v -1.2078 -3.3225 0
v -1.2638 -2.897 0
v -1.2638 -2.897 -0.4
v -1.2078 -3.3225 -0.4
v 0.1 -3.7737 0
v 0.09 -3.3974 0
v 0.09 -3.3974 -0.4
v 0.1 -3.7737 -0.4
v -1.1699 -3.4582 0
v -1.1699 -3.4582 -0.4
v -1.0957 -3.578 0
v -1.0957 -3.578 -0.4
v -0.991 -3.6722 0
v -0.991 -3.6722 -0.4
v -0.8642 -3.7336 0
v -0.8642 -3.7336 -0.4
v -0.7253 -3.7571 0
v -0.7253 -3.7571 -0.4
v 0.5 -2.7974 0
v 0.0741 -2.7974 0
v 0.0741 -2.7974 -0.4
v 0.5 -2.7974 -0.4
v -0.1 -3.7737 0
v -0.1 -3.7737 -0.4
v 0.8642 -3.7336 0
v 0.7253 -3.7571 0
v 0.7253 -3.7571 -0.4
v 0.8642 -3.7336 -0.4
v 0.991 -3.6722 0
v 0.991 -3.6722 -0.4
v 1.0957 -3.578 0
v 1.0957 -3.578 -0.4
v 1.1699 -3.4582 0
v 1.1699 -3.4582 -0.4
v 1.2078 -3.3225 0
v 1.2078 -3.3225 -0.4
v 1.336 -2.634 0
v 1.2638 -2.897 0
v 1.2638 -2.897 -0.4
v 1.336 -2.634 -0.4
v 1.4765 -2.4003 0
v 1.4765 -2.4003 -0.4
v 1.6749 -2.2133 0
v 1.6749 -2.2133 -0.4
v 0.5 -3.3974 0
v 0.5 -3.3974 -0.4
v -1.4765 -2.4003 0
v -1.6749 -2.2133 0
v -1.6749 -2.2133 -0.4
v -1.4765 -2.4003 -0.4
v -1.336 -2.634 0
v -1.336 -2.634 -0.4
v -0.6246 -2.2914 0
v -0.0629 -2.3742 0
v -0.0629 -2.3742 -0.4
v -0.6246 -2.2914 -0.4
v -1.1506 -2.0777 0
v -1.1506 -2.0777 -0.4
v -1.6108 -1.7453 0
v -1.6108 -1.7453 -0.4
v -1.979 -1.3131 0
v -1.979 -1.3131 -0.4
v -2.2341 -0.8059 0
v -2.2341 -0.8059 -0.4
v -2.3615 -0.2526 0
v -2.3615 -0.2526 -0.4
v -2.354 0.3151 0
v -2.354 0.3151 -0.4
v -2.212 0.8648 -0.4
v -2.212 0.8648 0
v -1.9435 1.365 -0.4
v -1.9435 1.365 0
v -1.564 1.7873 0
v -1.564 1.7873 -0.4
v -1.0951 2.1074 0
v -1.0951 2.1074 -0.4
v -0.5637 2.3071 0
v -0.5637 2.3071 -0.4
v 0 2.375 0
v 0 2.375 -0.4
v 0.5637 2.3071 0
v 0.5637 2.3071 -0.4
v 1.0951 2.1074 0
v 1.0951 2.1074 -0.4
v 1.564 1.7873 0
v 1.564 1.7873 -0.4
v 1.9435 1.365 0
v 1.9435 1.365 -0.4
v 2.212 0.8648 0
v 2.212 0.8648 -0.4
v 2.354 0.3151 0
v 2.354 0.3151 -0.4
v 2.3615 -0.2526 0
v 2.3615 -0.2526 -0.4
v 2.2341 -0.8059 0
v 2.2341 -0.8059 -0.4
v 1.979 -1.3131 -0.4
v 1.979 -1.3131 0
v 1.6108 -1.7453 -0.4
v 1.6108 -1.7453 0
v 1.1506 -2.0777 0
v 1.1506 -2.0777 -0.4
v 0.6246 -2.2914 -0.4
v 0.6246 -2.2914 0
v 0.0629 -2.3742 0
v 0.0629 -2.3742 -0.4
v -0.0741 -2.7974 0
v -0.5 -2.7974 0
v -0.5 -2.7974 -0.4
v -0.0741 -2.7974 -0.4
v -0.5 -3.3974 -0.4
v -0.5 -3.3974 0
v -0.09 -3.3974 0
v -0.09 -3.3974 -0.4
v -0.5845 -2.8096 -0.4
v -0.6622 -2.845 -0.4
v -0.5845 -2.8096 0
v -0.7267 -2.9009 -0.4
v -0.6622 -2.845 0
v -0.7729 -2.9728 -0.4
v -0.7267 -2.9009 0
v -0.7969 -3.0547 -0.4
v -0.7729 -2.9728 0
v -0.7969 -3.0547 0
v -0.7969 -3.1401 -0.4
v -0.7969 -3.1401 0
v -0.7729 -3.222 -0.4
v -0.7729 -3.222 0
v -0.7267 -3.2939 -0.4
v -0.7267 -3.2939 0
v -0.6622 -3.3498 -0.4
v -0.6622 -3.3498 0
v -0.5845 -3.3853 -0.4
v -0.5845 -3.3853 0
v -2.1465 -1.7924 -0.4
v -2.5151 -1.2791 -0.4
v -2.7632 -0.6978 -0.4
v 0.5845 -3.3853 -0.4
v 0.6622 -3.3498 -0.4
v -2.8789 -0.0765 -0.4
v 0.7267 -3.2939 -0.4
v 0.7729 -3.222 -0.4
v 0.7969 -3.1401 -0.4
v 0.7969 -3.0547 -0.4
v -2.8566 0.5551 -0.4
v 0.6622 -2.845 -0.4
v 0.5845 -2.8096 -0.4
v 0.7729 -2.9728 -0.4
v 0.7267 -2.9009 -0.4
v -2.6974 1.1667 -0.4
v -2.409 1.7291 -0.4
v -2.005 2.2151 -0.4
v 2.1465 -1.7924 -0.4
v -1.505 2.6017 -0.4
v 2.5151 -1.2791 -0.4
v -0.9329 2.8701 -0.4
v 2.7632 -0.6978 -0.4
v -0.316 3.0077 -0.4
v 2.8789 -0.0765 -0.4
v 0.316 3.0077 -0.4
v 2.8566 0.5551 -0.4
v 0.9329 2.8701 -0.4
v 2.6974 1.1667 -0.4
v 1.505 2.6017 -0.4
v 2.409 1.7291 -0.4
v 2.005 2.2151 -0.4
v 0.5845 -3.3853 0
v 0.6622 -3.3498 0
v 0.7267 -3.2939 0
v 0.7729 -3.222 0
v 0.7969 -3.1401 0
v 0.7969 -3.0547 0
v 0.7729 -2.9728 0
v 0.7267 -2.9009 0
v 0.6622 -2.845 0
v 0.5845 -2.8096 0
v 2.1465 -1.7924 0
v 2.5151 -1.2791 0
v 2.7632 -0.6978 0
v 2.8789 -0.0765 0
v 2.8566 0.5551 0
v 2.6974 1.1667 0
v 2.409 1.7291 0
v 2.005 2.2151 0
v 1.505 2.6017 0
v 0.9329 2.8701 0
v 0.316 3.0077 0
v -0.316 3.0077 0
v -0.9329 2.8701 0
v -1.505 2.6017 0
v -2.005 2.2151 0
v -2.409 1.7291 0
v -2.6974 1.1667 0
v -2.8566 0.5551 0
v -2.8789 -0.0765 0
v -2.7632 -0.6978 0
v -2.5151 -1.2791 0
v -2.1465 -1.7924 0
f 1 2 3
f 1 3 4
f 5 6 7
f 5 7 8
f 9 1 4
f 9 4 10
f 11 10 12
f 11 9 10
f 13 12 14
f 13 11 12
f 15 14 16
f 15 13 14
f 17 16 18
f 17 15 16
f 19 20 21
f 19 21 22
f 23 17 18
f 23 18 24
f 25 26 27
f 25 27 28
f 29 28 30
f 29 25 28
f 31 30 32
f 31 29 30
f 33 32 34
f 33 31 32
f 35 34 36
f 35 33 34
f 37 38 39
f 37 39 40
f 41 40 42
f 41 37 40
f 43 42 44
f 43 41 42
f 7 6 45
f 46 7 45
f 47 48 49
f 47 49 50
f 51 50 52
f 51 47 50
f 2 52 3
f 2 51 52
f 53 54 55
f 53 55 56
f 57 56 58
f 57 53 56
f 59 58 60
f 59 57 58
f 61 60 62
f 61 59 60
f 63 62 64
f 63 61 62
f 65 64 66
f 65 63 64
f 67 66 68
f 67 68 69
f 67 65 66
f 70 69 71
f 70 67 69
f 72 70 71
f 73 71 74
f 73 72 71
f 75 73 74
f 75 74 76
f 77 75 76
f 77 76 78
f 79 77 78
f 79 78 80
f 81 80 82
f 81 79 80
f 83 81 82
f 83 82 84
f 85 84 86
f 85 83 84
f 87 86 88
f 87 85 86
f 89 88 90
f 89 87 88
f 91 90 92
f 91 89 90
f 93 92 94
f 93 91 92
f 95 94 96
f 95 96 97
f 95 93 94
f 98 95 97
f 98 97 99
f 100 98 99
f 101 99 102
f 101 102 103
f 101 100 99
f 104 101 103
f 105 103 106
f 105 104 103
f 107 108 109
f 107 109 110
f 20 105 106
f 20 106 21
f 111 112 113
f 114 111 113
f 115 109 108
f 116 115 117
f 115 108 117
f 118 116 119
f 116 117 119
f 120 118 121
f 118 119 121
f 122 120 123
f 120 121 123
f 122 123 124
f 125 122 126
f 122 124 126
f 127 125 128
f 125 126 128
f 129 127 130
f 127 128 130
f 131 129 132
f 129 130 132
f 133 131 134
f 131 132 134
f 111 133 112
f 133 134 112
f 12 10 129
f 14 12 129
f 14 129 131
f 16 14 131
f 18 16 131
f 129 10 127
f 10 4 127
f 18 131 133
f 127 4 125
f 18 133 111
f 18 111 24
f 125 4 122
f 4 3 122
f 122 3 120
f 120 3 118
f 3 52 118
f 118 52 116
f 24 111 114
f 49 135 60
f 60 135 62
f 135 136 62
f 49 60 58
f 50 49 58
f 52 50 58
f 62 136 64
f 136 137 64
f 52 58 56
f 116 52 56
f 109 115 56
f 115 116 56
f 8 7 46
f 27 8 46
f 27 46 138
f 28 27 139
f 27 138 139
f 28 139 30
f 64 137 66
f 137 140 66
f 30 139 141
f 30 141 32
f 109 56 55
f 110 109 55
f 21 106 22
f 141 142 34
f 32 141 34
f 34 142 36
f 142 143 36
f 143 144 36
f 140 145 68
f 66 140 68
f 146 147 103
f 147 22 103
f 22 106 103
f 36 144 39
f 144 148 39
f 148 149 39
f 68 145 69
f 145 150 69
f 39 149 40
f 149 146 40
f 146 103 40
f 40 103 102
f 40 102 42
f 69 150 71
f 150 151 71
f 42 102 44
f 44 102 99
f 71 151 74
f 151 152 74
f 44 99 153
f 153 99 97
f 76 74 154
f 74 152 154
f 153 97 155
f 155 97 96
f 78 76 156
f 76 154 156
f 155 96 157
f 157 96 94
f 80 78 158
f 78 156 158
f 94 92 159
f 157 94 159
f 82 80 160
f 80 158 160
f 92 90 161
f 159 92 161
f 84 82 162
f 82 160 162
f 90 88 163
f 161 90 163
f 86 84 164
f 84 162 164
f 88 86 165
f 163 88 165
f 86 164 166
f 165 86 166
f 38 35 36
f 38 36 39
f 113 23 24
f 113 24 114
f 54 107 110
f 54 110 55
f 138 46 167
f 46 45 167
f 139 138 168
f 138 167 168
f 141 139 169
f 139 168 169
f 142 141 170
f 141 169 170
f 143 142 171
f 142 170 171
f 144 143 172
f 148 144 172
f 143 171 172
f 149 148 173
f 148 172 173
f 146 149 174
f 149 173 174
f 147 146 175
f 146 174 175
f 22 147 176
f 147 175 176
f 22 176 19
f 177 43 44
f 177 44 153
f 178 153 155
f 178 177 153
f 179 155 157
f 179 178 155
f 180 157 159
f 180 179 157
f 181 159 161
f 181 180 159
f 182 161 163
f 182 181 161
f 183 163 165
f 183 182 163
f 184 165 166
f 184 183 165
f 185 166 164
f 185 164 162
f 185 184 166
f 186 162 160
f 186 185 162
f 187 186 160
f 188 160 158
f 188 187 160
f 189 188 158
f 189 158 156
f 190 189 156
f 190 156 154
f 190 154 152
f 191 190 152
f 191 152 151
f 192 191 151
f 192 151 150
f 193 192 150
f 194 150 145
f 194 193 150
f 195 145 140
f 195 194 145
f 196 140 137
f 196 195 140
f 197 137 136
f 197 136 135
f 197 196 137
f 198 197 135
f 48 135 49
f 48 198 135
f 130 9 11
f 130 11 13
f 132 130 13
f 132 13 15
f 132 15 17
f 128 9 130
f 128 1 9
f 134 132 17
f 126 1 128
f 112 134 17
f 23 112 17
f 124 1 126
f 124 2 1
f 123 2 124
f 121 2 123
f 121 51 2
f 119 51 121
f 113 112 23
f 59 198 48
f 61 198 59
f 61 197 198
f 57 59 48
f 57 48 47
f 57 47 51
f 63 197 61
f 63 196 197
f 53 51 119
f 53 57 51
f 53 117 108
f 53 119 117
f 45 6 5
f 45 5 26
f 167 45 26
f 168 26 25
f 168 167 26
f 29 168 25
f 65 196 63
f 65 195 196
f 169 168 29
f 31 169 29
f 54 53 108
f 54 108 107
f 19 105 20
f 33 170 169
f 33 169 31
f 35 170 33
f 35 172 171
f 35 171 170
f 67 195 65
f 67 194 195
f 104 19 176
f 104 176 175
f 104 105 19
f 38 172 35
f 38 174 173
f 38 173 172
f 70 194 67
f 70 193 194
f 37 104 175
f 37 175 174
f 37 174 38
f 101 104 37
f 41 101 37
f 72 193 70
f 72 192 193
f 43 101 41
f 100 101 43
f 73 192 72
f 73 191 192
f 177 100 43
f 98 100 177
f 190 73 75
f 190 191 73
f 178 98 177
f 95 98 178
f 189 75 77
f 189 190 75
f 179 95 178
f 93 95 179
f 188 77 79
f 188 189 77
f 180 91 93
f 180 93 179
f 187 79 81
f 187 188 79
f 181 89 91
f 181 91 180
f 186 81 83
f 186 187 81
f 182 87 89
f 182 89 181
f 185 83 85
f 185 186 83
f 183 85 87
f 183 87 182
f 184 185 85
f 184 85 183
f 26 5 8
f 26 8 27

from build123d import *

# Parameters (mm, degrees)
BODYSKE_R   = 0.3
BODY_DEPTH  = 0.4
NOTSKE_W    = 1
NOTSKE_H    = 0.6
NOTCH_DEPTH = 1.4


with BuildPart() as part:
    # BodySke → Body (new body)
    with BuildSketch(Plane.XY):
        with BuildLine():
            Line((0.062913907, -2.374166557), (0.1, -3.773675264))
            Line((0.1, -3.773675264), (0.725313694, -3.757104848))
            ThreePointArc((0.725313694, -3.757104848), (1.046692153, -3.628800321), (1.207791092, -3.322543406))
            Line((1.207791092, -3.322543406), (1.26381232, -2.897019935))
            ThreePointArc((1.26381232, -2.897019935), (1.3982129, -2.512352239), (1.674947292, -2.213268924))
            ThreePointArc((1.674947292, -2.213268924), (0, 3.025), (-1.674947292, -2.213268924))
            ThreePointArc((-1.674947292, -2.213268924), (-1.3982129, -2.512352239), (-1.26381232, -2.897019935))
            Line((-1.26381232, -2.897019935), (-1.207791092, -3.322543406))
            ThreePointArc((-1.207791092, -3.322543406), (-1.046692153, -3.628800321), (-0.725313694, -3.757104848))
            Line((-0.725313694, -3.757104848), (-0.1, -3.773675264))
            Line((-0.1, -3.773675264), (-0.062913907, -2.374166557))
            ThreePointArc((-0.062913907, -2.374166557), (0, 2.375), (0.062913907, -2.374166557))
        make_face()
        with Locations((0.5, -3.097403146)):
            Circle(BODYSKE_R, mode=Mode.SUBTRACT)
        with Locations((-0.5, -3.097403146)):
            Circle(BODYSKE_R, mode=Mode.SUBTRACT)
    extrude(amount=-BODY_DEPTH)

    # NotSke → Notch (cut, through all)
    with BuildSketch(Plane.XY):
        with Locations((0, -3.097403146)):
            Rectangle(NOTSKE_W, NOTSKE_H)
    extrude(amount=-NOTCH_DEPTH, mode=Mode.SUBTRACT)


solid = part.part
